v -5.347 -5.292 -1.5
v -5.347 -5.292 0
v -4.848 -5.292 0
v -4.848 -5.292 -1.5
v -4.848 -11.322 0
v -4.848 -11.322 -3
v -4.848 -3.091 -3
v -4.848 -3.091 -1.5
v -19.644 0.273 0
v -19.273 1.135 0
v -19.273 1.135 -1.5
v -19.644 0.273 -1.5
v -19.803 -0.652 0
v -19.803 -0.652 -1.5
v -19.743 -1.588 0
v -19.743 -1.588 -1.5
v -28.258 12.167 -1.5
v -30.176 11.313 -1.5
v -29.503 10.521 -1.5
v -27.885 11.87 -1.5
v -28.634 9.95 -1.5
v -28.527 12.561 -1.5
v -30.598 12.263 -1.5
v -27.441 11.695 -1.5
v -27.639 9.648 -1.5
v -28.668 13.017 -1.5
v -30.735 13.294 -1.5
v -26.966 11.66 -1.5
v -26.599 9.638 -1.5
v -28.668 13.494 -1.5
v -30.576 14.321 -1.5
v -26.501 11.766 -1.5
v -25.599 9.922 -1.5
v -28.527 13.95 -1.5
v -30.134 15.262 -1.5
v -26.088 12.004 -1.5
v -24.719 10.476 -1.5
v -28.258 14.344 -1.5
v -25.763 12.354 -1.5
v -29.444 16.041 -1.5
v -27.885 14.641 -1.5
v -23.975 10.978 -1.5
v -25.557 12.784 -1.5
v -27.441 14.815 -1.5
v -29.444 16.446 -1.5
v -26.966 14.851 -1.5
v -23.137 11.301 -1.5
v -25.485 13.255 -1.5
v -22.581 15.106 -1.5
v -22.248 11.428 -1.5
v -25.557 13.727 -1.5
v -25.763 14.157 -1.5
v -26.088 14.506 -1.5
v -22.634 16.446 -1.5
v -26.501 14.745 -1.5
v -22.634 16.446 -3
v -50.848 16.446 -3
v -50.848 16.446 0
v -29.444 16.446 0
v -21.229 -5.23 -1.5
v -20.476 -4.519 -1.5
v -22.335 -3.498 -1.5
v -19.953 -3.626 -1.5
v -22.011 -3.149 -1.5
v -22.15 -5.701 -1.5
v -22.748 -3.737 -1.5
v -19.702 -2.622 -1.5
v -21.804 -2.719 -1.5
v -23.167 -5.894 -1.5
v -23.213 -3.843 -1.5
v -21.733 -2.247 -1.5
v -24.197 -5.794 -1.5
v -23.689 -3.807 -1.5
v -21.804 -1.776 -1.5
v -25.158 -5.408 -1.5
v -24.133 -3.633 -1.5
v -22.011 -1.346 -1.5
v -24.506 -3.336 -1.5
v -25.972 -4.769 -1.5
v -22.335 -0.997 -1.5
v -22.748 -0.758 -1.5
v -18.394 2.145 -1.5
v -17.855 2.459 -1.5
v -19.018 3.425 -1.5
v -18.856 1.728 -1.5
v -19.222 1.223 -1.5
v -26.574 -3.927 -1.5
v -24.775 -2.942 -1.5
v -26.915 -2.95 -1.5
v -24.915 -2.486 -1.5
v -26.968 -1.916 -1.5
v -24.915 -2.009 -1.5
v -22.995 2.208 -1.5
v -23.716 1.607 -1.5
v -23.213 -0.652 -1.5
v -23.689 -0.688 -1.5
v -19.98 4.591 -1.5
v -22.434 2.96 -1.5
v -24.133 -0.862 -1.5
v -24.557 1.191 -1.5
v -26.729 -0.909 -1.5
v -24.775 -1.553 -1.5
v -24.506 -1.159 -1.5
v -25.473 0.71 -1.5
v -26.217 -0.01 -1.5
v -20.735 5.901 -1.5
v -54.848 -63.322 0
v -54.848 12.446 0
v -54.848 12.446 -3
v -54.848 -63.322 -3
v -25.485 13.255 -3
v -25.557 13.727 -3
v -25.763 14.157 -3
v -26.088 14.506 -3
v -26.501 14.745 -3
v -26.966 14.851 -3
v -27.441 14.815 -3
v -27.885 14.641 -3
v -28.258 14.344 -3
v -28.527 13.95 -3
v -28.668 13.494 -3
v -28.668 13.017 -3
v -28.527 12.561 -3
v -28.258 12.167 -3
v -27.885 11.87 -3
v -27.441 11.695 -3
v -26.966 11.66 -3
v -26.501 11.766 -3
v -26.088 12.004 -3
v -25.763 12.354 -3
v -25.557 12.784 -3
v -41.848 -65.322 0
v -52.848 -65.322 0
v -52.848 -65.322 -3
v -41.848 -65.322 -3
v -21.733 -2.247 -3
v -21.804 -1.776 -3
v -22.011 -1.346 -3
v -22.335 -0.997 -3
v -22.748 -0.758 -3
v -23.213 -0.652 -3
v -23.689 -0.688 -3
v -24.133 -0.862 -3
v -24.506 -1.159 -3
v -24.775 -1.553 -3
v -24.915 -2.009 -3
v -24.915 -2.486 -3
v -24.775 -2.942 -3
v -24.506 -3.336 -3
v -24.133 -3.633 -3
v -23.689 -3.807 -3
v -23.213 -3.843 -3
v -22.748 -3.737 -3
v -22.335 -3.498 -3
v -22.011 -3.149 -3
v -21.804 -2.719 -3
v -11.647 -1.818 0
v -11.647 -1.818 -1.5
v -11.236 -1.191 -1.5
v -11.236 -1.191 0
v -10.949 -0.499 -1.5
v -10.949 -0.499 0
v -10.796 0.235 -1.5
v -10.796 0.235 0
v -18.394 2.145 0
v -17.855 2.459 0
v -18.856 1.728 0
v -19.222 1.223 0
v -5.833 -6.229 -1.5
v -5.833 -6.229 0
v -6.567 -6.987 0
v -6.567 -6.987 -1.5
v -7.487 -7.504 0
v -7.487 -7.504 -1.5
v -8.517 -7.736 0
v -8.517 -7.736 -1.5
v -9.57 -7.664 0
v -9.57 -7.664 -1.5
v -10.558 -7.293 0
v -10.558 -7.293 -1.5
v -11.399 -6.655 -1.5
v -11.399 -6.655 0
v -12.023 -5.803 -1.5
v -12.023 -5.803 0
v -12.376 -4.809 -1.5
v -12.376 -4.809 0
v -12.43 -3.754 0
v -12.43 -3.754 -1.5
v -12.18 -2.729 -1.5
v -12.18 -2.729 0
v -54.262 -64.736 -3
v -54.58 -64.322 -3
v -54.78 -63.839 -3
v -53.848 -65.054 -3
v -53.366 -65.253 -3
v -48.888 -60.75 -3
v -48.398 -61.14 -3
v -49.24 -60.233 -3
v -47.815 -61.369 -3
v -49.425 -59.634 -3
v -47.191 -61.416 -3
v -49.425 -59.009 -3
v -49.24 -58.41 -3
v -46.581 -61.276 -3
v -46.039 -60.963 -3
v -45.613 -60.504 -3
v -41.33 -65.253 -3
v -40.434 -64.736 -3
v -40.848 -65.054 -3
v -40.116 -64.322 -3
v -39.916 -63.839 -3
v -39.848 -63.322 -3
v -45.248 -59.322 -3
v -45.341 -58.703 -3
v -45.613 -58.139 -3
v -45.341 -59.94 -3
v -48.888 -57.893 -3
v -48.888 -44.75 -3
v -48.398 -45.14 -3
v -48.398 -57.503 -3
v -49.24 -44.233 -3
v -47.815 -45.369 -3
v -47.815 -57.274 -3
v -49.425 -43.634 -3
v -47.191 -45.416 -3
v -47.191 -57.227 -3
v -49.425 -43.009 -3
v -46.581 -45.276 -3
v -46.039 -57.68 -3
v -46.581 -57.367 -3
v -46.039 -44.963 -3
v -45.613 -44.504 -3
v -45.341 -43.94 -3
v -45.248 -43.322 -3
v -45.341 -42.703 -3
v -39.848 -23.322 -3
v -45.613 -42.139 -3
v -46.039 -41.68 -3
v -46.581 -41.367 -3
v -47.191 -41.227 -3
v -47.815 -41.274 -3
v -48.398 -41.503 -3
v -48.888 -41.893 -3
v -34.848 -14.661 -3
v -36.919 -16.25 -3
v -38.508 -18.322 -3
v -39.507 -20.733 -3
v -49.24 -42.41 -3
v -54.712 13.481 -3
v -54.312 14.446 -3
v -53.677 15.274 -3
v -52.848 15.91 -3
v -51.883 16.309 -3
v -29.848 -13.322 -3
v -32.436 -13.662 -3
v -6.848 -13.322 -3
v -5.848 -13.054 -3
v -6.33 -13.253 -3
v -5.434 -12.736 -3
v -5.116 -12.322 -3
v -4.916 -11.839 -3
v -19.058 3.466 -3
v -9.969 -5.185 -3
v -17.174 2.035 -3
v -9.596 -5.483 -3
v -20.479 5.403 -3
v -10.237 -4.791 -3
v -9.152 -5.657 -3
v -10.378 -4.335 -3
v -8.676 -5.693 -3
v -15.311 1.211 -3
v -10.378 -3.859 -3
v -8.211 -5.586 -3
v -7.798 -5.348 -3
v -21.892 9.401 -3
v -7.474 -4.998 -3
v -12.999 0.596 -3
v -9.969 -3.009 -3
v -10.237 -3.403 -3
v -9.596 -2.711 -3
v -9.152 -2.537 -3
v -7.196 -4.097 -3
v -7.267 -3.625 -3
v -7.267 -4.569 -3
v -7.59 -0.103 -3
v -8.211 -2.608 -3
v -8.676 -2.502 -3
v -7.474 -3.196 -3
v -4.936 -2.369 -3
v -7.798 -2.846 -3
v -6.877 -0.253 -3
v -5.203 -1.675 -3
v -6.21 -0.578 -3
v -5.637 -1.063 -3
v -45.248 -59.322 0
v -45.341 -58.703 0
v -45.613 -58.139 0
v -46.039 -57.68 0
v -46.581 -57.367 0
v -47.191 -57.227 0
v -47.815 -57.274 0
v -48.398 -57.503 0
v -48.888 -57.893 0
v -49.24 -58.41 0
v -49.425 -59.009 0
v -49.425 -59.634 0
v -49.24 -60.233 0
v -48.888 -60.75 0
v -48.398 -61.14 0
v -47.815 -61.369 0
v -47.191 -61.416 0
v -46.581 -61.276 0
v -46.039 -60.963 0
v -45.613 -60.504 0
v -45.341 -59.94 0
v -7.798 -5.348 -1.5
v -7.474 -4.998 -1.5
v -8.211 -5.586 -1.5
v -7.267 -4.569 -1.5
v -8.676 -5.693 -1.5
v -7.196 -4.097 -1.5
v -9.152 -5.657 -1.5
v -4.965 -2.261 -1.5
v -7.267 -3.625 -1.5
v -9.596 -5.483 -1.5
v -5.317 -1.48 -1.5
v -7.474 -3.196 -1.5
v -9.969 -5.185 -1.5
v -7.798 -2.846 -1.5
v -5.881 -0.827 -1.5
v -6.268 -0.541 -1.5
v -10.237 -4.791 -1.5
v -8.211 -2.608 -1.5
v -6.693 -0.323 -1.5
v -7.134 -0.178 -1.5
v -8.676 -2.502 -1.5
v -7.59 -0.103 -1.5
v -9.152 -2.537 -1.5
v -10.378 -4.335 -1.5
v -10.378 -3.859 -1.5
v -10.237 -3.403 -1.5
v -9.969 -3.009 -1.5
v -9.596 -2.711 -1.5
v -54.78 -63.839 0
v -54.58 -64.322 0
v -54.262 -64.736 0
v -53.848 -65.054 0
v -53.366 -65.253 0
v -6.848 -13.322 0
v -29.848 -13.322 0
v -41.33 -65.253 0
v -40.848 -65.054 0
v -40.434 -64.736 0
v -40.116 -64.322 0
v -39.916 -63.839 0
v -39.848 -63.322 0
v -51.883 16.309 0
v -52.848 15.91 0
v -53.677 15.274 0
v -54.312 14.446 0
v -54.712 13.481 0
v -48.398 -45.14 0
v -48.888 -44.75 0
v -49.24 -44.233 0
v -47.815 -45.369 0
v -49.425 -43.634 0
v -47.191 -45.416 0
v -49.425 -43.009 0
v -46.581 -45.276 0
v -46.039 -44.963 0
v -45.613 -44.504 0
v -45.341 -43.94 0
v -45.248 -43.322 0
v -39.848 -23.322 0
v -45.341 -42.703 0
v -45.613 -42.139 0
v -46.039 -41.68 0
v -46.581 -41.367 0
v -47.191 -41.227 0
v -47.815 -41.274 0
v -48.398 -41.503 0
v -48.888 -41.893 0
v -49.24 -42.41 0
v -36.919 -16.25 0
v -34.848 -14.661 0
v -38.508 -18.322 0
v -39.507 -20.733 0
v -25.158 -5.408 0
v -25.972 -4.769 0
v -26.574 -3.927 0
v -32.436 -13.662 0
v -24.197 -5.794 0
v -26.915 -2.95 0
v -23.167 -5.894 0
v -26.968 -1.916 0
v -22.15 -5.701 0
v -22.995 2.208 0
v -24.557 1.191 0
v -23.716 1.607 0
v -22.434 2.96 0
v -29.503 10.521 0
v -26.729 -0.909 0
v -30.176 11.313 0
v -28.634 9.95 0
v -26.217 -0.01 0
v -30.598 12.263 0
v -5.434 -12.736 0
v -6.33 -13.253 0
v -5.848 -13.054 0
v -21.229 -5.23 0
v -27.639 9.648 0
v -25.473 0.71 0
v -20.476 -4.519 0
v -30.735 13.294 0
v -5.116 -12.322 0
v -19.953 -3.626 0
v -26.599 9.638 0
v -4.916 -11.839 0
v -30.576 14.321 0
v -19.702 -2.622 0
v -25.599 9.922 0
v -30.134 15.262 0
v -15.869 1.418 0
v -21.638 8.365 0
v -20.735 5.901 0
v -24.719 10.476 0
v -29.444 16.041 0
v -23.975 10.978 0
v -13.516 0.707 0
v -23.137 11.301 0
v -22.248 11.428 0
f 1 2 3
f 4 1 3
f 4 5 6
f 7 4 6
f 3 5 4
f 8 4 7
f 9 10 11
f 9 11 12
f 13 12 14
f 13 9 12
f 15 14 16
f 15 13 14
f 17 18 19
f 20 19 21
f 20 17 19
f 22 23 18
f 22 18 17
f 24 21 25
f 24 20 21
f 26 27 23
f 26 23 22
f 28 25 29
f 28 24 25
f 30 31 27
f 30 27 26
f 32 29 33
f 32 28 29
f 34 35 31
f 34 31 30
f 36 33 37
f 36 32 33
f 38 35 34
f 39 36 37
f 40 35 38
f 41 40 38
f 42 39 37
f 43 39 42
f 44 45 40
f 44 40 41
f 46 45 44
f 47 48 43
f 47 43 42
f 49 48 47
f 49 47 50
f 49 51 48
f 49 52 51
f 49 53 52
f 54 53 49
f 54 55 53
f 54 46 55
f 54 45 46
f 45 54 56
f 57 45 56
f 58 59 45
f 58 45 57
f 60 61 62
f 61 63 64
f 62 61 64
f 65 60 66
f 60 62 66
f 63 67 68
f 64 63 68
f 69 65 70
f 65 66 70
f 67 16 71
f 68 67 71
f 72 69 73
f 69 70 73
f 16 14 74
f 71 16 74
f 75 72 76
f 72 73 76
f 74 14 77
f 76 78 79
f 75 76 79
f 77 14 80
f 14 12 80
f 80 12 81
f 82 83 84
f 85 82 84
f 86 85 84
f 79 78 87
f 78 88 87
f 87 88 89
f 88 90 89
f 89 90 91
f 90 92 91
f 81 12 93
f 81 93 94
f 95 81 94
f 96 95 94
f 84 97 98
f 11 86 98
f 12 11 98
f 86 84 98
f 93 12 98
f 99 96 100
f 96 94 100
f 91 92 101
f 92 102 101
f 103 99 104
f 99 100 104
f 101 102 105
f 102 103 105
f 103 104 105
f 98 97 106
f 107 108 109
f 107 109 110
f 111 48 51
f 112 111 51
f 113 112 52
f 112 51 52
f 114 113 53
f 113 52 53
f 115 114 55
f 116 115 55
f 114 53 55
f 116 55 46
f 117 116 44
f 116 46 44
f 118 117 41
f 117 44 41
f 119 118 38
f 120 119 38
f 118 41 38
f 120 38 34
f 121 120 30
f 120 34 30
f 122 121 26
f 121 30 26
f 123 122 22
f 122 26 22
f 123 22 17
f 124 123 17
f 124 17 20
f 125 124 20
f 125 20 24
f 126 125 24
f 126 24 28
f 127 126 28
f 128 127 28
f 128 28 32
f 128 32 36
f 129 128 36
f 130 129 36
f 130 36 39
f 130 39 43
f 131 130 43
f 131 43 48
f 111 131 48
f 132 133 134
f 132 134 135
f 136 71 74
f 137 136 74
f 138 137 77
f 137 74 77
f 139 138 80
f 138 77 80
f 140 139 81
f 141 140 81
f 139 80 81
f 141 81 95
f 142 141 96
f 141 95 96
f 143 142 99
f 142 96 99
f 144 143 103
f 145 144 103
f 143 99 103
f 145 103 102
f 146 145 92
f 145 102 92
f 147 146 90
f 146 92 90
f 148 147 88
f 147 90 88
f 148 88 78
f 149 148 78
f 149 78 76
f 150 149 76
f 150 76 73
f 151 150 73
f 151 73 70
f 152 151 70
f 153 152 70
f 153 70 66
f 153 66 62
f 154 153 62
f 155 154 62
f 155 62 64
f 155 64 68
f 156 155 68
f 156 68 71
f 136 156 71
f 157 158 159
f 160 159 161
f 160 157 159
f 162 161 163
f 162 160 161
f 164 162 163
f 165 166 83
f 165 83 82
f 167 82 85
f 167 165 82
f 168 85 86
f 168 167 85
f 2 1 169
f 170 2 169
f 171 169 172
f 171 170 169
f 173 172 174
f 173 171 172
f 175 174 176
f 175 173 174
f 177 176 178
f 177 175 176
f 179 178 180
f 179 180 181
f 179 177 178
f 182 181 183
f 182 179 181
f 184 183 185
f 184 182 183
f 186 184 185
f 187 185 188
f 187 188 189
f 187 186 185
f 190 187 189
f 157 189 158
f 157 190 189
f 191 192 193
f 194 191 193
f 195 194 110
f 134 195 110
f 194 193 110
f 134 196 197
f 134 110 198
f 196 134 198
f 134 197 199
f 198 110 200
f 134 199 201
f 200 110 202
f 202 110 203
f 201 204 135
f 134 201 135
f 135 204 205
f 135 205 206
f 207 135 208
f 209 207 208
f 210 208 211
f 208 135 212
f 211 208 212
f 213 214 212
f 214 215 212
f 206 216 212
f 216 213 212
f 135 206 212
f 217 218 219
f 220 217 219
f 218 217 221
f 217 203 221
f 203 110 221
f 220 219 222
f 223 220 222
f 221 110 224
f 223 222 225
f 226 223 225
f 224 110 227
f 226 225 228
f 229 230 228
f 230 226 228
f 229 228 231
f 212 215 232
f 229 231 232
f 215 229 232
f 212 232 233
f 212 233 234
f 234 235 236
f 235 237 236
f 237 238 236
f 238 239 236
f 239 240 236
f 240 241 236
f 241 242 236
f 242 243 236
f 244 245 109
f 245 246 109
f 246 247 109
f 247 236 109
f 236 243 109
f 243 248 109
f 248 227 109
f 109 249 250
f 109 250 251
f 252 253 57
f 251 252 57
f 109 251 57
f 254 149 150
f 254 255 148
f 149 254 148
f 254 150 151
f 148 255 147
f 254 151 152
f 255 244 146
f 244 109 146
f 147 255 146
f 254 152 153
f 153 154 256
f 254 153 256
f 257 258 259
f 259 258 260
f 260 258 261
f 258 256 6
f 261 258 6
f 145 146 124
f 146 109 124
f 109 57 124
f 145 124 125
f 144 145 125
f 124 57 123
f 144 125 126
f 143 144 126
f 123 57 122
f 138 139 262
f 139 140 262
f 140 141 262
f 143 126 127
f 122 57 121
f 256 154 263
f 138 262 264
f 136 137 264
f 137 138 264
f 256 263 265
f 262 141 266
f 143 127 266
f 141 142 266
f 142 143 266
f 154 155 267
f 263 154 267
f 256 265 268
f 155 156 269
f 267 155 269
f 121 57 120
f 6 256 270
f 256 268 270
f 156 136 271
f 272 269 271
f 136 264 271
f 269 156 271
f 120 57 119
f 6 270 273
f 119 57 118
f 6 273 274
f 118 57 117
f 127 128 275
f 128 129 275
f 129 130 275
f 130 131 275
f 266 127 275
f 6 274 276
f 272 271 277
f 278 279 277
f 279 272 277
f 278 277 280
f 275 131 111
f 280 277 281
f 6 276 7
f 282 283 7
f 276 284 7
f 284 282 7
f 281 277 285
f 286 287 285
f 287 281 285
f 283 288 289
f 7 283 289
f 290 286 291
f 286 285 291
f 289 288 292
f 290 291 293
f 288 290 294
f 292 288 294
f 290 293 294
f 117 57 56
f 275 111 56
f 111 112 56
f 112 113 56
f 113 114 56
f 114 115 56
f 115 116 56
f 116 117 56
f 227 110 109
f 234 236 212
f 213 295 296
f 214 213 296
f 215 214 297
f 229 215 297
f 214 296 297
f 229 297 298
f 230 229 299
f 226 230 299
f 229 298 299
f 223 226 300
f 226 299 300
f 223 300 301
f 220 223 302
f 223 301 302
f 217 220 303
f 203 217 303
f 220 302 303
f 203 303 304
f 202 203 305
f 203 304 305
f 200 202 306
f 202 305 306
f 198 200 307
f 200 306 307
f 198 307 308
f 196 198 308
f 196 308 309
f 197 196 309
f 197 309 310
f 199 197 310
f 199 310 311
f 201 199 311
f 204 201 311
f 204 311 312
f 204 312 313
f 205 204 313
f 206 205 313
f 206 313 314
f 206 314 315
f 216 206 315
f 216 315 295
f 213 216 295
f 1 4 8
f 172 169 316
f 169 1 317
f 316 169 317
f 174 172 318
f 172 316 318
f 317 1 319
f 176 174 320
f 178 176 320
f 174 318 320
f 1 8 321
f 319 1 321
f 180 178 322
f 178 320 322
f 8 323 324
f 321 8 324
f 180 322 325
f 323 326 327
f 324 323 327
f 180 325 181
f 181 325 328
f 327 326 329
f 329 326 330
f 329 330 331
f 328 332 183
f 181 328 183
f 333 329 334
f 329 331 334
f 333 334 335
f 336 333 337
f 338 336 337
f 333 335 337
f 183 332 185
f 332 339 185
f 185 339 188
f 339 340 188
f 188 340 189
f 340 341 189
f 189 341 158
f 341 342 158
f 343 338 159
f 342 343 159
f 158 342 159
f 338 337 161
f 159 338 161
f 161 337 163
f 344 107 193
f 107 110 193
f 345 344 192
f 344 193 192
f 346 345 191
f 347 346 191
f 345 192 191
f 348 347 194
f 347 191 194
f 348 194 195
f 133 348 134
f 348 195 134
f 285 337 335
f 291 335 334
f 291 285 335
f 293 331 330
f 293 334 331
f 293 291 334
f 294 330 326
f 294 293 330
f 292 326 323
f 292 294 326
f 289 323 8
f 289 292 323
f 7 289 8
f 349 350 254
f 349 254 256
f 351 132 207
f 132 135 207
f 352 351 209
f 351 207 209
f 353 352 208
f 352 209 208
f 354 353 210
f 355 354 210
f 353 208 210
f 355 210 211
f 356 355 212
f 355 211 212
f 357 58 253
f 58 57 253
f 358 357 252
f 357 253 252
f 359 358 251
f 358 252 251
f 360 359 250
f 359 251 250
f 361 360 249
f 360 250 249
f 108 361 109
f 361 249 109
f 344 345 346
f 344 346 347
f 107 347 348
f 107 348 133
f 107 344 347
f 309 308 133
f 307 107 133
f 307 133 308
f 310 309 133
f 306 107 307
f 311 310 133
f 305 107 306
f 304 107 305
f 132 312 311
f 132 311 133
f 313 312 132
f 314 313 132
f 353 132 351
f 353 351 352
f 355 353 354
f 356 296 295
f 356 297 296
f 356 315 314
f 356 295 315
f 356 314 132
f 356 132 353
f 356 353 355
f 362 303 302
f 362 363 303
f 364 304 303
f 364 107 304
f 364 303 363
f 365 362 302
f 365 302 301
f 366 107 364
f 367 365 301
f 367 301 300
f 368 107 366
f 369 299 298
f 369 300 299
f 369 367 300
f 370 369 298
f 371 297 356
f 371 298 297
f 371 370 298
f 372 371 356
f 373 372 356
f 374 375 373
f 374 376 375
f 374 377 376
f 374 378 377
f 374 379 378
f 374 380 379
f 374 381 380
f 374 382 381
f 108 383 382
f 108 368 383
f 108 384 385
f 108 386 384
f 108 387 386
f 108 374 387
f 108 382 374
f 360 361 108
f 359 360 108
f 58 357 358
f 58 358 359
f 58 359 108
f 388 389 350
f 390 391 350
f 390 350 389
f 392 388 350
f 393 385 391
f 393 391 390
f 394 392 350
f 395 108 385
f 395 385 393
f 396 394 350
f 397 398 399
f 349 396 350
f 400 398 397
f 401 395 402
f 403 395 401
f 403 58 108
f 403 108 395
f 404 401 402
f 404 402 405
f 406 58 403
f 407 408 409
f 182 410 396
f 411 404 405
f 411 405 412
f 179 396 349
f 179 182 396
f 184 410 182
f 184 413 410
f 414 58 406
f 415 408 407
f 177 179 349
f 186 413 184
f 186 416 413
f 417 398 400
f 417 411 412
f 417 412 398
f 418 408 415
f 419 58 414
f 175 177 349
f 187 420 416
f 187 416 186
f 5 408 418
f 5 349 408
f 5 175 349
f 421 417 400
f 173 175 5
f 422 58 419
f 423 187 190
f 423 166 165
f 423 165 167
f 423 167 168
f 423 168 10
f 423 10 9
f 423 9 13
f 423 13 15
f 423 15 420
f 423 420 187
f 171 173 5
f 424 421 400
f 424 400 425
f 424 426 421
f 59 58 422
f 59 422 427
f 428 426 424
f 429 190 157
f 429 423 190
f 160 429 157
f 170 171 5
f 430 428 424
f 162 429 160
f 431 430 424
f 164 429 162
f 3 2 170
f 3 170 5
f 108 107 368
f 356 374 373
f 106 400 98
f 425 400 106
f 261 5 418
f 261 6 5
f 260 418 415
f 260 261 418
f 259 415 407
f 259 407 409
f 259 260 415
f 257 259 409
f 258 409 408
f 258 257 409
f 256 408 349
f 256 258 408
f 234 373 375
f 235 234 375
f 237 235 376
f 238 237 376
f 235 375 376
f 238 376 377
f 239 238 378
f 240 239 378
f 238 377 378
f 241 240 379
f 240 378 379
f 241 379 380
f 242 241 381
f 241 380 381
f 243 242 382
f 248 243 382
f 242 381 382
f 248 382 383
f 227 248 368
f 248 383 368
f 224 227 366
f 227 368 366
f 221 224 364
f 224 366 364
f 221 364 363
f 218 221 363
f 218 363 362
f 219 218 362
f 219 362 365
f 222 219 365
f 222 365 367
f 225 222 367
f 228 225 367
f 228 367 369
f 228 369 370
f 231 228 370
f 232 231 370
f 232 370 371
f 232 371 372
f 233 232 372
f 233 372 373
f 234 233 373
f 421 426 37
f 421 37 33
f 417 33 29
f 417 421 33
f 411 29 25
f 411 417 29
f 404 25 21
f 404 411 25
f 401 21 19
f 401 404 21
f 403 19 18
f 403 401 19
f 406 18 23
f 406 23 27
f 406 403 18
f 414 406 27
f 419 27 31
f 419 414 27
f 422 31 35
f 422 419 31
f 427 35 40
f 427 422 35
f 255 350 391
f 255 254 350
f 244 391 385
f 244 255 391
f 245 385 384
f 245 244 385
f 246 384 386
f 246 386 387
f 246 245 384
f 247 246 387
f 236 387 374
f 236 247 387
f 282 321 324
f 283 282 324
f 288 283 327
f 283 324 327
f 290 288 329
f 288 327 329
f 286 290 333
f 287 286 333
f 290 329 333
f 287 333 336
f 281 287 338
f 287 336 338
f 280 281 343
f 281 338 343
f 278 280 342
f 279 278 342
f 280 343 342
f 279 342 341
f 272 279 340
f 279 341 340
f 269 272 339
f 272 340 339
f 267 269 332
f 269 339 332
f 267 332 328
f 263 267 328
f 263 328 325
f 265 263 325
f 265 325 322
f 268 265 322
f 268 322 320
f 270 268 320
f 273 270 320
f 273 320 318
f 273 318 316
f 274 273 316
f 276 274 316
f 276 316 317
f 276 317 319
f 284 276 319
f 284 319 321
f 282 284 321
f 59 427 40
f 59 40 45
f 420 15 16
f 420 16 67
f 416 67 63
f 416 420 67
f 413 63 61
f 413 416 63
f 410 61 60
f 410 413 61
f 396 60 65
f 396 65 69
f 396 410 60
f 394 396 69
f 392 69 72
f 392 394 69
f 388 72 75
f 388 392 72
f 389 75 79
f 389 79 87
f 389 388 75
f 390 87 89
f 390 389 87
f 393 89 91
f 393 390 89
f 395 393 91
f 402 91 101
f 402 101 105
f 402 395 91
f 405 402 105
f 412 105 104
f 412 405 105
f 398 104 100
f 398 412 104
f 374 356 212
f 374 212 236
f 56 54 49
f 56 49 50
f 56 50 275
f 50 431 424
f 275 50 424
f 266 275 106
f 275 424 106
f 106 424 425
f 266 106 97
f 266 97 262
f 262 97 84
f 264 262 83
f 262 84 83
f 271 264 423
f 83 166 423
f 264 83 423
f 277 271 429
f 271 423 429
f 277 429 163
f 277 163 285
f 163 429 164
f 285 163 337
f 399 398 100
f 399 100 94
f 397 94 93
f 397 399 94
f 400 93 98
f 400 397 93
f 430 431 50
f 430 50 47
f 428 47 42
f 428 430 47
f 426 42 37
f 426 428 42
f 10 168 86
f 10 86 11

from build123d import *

# Parameters (mm, degrees)
BOSS_EXTRUDE3_DEPTH = 3
FILLET1_R           = 2
SKETCH12_R          = 2.1
CUT_EXTRUDE5_DEPTH  = 10
FILLET5_R           = 4
FILLET6_R           = 3
FILLET7_R           = 10
CUT_EXTRUDE9_DEPTH  = 1.5
SKETCH17_W          = 7.951649766
SKETCH17_H          = 5.272619773
SKETCH17_W_2        = 3.894064167
SKETCH17_H_2        = 6.195846789
CUT_EXTRUDE10_DEPTH = 1.5
SKETCH18_R          = 1.6
CUT_EXTRUDE11_DEPTH = 10


with BuildPart() as part:
    # Sketch8 → Boss-Extrude3 (new body)
    with BuildSketch(Plane.XY):
        with BuildLine():
            Line((-4.848101441, -13.321505966), (-4.848101441, -0.321505966))
            add(Edge.make_bspline(
                [(-22.634292007, 16.445697007), (-22.442914483, 9.994307564), (-20.126223523, 0.876298034), (-11.53370308, 0.191019868), (-4.848101441, -0.321505966)],
                knots=[0, 0, 0, 0, 0.444535858, 1, 1, 1, 1], degree=3))
            Line((-22.634292007, 16.445697007), (-54.848101441, 16.445697007))
            Line((-54.848101441, 16.445697007), (-54.848101441, -65.321505966))
            Line((-54.848101441, -65.321505966), (-39.848101441, -65.321505966))
            Line((-39.848101441, -65.321505966), (-39.848101441, -13.321505966))
            Line((-39.848101441, -13.321505966), (-4.848101441, -13.321505966))
        make_face()
    extrude(amount=-BOSS_EXTRUDE3_DEPTH)

    # Fillet1
    fillet1_edges = [part.edges().sort_by_distance(p)[0] for p in [
        (-4.848101441, -13.321505966, -1.5),
        (-39.848101441, -65.321505966, -1.5),
        (-54.848101441, -65.321505966, -1.5),
    ]]
    fillet(fillet1_edges, radius=FILLET1_R)

    # Sketch12 → Cut-Extrude5 (cut)
    with BuildSketch(Plane.XY):
        with Locations((-47.348101441, -43.321505966)):
            Circle(SKETCH12_R)
        with Locations((-47.348101441, -59.321505966)):
            Circle(SKETCH12_R)
    extrude(amount=-CUT_EXTRUDE5_DEPTH, mode=Mode.SUBTRACT)

    # Fillet5
    fillet5_edges = [part.edges().sort_by_distance(p)[0] for p in [
        (-54.848101441, 16.445697007, -1.5),
    ]]
    fillet(fillet5_edges, radius=FILLET5_R)

    # Fillet6
    fillet6_edges = [part.edges().sort_by_distance(p)[0] for p in [
        (-4.848101441, -0.321505966, -1.5),
    ]]
    fillet(fillet6_edges, radius=FILLET6_R)

    # Fillet7
    fillet7_edges = [part.edges().sort_by_distance(p)[0] for p in [
        (-39.848101441, -13.321505966, -1.5),
    ]]
    fillet(fillet7_edges, radius=FILLET7_R)

    # Sketch16 → Cut-Extrude9 (cut)
    with BuildSketch(Plane.XY):
        with BuildLine():
            Line((-9.100213088, 21.316177145), (-9.209573917, 22.566177145))
            Line((-9.209573917, 22.566177145), (-11.640691005, 22.566177145))
            add(Edge.make_bspline(
                [(-11.640691005, 22.566177145), (-15.022495372, 19.340372794), (-15.924452017, 14.756685891)],
                knots=[0, 0, 0, 1, 1, 1], degree=2))
            ThreePointArc((-15.924452017, 14.756685891), (-15.222749011, 12.914891859), (-16.441177254, 11.365690457))
            add(Edge.make_bspline(
                [(-14.837210154, 6.041686336), (-16.459215455, 8.47618894), (-16.441177254, 11.365690457)],
                knots=[0, 0, 0, 1, 1, 1], degree=2))
            ThreePointArc((-14.837210154, 6.041686336), (-13.061711204, 6.261247316), (-11.820884577, 4.972467727))
            Line((-11.820884577, 4.972467727), (-6.820884577, 4.972467727))
            Line((-6.820884577, 4.972467727), (-6.820884577, 0.680172774))
            ThreePointArc((-6.820884577, 0.680172774), (-6.595588162, -0.64331234), (-5.945078154, -1.817709228))
            ThreePointArc((-5.945078154, -1.817709228), (-8.795904792, -7.747026555), (-11.646731431, -1.817709228))
            ThreePointArc((-11.646731431, -1.817709228), (-10.996221423, -0.64331234), (-10.770925007, 0.680172774))
            Line((-10.770925007, 0.680172774), (-10.770925007, 2.723195944))
            Line((-10.770925007, 2.723195944), (-12.604024539, 2.723195944))
            ThreePointArc((-12.604024539, 2.723195944), (-13.729925577, 2.376177145), (-14.855826616, 2.723195944))
            Line((-14.855826616, 2.723195944), (-16.623775808, 2.723195944))
            ThreePointArc((-16.623775808, 2.723195944), (-18.123775808, 2.321272155), (-19.22185202, 1.223195944))
            Line((-19.22185202, 1.223195944), (-19.272943939, 1.134702143))
            ThreePointArc((-19.272943939, 1.134702143), (-19.750526635, -0.18476513), (-19.743016315, -1.587983826))
            ThreePointArc((-19.743016315, -1.587983826), (-25.157950081, -5.408427498), (-24.556815691, 1.19126454))
            ThreePointArc((-24.556815691, 1.19126454), (-23.337837493, 1.88636976), (-22.433936663, 2.959702143))
            Line((-22.433936663, 2.959702143), (-19.683732235, 7.723195944))
            add(Edge.make_bspline(
                [(-19.683732235, 7.723195944), (-19.261177539, 8.547983183), (-18.924513654, 9.521118545), (-19.229981569, 11.075334784), (-20.358554935, 11.423731791), (-20.93203262, 11.430328812)],
                knots=[0, 0, 0, 0, 0.295584427, 0.638506801, 1, 1, 1, 1], degree=3))
            Line((-20.93203262, 11.430328812), (-22.12642518, 11.430328812))
            ThreePointArc((-22.12642518, 11.430328812), (-23.507908706, 11.184193923), (-24.719376585, 10.476080446))
            ThreePointArc((-24.719376585, 10.476080446), (-30.735444741, 13.255328812), (-24.719376585, 16.034577178))
            ThreePointArc((-24.719376585, 16.034577178), (-23.507908706, 15.326463702), (-22.12642518, 15.080328812))
            Line((-22.12642518, 15.080328812), (-20.976183849, 15.080328812))
            ThreePointArc((-20.976183849, 15.080328812), (-18.688287573, 15.799242006), (-17.222790707, 17.697563496))
            add(Edge.make_bspline(
                [(-11.640691005, 24.566177145), (-14.244308048, 22.933045591), (-16.184240838, 20.516614501), (-17.222790707, 17.697563496)],
                knots=[0, 0, 0, 0, 0.773209578, 0.773209578, 0.773209578, 0.773209578], degree=3))
            Line((-11.640691005, 24.566177145), (-8.140691005, 24.566177145))
            Line((-8.140691005, 24.566177145), (-8.140691005, 22.568020283))
            Line((-8.140691005, 22.568020283), (-8.250213088, 21.316177145))
            Line((-8.250213088, 21.316177145), (-9.100213088, 21.316177145))
        make_face()
    extrude(amount=-CUT_EXTRUDE9_DEPTH, mode=Mode.SUBTRACT)

    # Sketch17 → Cut-Extrude10 (cut)
    with BuildSketch(Plane.XY):
        with Locations((-25.46861182, 15.757865506)):
            Rectangle(SKETCH17_W, SKETCH17_H)
        with Locations((-5.398647621, -2.193777117)):
            Rectangle(SKETCH17_W_2, SKETCH17_H_2)
    extrude(amount=-CUT_EXTRUDE10_DEPTH, mode=Mode.SUBTRACT)

    # Sketch18 → Cut-Extrude11 (cut)
    with BuildSketch(Plane.XY.offset(-1.5)):
        with Locations((-27.085444741, 13.255328812)):
            Circle(SKETCH18_R)
        with Locations((-23.332950081, -2.247434774)):
            Circle(SKETCH18_R)
        with Locations((-8.795904792, -4.097026555)):
            Circle(SKETCH18_R)
    extrude(amount=-CUT_EXTRUDE11_DEPTH, mode=Mode.SUBTRACT)


solid = part.part
